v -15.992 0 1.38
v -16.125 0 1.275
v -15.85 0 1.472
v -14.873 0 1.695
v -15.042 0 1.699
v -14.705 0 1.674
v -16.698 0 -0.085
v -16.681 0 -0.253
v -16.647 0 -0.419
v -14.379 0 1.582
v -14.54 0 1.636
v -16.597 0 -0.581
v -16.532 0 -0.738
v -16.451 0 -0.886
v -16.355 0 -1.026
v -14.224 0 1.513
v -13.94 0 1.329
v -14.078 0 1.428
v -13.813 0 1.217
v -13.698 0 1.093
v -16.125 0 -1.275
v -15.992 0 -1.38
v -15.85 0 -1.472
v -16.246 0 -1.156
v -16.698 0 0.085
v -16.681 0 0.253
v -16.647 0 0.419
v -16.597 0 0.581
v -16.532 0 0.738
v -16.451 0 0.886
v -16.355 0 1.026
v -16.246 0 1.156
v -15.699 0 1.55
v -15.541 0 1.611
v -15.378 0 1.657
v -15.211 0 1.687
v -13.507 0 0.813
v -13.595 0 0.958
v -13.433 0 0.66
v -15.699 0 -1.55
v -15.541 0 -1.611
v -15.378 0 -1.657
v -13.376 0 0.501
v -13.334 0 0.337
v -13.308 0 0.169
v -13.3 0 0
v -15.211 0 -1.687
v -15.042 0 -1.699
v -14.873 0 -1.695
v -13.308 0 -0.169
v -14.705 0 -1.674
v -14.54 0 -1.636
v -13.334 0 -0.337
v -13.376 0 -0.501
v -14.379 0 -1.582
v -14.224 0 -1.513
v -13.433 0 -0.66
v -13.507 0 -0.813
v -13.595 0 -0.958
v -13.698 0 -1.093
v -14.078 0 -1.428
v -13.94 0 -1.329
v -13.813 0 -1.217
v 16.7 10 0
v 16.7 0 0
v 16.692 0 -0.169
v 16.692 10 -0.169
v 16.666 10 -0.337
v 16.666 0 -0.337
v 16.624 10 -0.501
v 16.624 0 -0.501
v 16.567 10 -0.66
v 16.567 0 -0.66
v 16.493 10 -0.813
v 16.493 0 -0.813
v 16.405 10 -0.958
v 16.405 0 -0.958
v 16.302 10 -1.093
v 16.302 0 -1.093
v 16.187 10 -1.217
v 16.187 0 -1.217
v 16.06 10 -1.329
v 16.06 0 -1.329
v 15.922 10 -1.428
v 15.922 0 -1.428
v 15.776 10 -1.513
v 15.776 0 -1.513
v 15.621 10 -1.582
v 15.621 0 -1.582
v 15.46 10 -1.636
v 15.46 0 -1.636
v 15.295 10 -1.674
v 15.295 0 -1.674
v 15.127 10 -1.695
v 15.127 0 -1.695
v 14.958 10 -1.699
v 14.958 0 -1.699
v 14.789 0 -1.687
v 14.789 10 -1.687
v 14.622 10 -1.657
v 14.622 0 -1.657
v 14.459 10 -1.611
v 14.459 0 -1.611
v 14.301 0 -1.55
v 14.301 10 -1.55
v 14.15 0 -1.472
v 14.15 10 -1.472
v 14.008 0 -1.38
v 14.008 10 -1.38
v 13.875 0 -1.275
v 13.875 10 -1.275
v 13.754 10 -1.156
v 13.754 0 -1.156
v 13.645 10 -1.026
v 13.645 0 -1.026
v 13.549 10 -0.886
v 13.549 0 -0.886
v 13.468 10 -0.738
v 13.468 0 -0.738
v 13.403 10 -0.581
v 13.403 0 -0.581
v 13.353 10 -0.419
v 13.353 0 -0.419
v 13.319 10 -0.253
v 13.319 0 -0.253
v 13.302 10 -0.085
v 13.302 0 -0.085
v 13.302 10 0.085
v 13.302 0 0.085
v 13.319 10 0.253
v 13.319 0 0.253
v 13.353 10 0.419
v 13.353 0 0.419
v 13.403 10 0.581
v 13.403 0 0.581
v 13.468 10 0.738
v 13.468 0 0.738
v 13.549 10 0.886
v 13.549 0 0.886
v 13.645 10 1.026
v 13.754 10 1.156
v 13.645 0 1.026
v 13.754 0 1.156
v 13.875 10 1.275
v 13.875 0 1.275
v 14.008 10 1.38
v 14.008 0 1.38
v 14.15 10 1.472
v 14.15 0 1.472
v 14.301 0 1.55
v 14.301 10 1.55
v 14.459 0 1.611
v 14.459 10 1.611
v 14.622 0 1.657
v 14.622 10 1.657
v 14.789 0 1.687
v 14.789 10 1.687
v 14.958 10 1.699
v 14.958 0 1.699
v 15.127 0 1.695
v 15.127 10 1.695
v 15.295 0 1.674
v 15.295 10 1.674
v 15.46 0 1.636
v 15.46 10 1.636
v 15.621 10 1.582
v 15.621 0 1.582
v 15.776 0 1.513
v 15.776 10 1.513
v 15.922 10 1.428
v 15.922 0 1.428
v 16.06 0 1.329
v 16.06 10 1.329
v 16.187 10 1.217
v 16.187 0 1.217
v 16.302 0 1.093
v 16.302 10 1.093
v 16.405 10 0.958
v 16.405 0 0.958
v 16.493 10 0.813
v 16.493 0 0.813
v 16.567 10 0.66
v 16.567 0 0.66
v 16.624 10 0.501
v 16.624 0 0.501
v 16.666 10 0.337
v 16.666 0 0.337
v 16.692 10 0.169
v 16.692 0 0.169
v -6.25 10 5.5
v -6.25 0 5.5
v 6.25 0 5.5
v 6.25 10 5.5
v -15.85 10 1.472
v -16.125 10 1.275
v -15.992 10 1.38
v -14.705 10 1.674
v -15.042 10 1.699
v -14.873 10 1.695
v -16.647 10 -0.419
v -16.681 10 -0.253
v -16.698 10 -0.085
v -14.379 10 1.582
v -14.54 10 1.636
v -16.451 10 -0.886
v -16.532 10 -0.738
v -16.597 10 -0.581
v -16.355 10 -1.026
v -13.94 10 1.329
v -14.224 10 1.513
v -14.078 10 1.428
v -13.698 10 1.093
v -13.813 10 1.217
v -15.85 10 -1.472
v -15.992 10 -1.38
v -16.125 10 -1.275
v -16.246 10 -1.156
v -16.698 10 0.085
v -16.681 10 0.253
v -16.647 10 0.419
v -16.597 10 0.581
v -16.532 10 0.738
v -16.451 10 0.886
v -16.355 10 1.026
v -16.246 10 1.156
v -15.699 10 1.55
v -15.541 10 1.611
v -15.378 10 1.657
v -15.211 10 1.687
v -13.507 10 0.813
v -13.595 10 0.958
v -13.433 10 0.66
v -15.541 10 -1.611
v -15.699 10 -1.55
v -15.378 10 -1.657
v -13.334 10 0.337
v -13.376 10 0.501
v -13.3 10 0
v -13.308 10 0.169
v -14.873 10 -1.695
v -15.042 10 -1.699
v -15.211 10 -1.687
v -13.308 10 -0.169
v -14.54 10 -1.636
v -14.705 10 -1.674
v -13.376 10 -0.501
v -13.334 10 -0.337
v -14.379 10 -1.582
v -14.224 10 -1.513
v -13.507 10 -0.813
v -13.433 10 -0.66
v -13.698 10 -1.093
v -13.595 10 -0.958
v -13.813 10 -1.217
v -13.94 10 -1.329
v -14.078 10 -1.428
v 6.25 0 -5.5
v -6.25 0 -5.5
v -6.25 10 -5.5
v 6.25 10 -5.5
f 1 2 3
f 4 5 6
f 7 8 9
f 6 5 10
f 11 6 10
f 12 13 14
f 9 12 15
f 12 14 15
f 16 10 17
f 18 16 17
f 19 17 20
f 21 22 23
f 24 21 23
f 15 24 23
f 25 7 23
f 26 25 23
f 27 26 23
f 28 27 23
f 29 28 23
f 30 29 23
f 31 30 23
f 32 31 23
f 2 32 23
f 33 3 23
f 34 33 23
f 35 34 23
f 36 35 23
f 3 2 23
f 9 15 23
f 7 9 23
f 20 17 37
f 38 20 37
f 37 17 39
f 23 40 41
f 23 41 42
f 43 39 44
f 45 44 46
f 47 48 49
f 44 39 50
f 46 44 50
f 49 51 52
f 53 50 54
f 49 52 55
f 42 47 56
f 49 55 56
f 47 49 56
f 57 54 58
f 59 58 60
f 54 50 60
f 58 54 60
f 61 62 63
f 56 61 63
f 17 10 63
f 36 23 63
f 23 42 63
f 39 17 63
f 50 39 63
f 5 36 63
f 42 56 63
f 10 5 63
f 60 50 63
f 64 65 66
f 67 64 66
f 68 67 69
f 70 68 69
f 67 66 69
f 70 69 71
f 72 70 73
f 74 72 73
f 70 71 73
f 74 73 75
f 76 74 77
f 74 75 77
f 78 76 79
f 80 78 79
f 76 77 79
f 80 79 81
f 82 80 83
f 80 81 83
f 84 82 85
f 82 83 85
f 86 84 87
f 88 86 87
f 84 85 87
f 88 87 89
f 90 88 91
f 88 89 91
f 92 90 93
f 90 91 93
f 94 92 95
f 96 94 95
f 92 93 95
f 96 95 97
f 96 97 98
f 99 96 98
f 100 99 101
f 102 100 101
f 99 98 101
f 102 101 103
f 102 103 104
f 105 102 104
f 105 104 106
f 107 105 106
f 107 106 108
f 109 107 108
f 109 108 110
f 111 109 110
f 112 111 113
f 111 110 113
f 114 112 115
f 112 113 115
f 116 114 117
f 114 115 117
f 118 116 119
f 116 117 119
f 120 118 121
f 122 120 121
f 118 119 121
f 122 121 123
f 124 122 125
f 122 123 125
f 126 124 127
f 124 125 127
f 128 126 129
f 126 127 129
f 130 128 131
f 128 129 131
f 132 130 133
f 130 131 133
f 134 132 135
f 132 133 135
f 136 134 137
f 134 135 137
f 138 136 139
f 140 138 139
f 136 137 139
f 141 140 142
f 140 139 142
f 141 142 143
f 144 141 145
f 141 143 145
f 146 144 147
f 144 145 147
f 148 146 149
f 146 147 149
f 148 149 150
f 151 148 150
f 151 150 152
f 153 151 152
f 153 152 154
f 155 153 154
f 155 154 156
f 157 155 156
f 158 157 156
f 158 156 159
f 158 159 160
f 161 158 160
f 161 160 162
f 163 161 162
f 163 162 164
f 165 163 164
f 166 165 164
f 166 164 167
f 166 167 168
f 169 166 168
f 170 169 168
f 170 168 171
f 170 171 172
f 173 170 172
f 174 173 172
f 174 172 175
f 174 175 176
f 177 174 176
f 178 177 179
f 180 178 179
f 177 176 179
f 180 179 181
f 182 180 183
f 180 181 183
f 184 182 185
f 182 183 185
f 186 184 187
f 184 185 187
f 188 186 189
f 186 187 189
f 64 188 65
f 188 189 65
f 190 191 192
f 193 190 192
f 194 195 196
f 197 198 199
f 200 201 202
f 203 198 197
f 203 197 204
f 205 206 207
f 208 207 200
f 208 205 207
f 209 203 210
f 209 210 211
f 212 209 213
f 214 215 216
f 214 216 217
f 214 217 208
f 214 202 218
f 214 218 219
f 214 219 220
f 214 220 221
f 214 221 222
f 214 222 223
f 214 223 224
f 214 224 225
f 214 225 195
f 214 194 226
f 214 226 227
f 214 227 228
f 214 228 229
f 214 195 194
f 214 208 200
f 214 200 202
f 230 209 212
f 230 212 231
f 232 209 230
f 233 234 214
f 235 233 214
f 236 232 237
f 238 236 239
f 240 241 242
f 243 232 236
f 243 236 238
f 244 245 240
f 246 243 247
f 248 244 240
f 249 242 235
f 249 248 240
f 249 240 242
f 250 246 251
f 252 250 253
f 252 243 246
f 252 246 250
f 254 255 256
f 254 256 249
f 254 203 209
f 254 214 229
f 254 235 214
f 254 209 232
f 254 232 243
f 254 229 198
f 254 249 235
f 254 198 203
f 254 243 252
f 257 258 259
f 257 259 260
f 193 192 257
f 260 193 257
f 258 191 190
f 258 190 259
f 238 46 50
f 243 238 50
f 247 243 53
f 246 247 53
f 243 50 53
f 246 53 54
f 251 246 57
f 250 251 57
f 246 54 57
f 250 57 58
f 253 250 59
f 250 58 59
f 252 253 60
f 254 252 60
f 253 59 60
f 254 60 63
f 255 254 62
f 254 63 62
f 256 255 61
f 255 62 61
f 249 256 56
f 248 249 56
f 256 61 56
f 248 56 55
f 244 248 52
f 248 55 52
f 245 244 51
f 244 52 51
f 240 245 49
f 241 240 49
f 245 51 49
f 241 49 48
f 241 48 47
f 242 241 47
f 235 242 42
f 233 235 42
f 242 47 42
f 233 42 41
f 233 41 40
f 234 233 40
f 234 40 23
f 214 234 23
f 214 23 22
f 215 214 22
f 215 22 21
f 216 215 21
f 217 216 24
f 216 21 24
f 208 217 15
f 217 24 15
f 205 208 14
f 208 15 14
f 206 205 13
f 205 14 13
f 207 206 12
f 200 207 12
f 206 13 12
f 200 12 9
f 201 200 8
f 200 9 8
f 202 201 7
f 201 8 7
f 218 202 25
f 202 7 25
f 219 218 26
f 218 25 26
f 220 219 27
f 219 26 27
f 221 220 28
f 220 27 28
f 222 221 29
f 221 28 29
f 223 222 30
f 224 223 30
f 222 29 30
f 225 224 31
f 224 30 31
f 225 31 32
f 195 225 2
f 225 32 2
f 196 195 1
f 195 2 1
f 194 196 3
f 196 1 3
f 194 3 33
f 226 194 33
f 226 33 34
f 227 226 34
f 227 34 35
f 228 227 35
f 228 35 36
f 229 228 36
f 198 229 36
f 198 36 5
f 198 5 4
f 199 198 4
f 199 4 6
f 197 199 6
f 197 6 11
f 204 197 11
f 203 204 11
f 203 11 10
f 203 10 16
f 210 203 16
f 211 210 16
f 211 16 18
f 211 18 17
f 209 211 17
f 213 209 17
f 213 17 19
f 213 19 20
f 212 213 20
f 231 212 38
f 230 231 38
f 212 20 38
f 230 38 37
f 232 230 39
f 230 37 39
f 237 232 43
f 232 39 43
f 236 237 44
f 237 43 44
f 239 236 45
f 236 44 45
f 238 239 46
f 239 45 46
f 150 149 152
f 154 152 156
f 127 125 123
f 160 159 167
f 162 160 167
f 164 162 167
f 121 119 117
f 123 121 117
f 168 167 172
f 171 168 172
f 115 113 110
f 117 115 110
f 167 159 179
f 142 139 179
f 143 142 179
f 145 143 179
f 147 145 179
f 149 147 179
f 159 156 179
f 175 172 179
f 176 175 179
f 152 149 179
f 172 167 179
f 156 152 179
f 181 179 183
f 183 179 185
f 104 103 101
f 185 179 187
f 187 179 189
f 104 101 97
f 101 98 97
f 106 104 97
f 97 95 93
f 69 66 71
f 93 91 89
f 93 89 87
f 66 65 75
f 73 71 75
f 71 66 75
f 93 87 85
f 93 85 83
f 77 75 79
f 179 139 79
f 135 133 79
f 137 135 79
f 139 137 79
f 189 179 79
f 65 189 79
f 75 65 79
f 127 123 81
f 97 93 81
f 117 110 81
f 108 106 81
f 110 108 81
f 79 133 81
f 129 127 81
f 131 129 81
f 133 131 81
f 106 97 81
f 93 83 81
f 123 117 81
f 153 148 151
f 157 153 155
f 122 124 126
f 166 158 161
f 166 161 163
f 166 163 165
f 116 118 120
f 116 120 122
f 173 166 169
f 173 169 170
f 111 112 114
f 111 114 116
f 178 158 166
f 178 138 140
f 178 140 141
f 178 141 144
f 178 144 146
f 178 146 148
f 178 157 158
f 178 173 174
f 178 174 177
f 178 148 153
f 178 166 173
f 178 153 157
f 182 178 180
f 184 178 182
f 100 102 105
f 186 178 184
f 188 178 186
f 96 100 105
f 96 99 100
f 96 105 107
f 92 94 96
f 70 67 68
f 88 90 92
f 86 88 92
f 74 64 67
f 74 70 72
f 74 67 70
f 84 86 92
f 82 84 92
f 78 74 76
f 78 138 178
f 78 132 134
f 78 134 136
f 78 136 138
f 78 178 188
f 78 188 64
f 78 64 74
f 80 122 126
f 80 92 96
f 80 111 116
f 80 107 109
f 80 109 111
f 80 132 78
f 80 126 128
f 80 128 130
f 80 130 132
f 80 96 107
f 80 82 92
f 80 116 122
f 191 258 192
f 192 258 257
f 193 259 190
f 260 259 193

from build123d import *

# Parameters (mm, degrees)
SKETCH2_R             = 1.7
BOSS_EXTRUDE1_DEPTH   = 10
BOSS_EXTRUDE1_2_DEPTH = 10
SKETCH2_W             = 12.5
SKETCH2_H             = 11
BOSS_EXTRUDE1_3_DEPTH = 10


with BuildPart() as part:
    # Sketch2 → Boss-Extrude1 (new body)
    with BuildSketch(Plane(origin=(0, 0, 0), x_dir=(1, 0, 0), z_dir=(0, 1, 0))):
        with Locations((15, 0)):
            Circle(SKETCH2_R)
    extrude(amount=BOSS_EXTRUDE1_DEPTH)


with BuildPart() as body_2:
    # Sketch2 → Boss-Extrude1 2 (new body)
    with BuildSketch(Plane(origin=(0, 0, 0), x_dir=(1, 0, 0), z_dir=(0, 1, 0))):
        with Locations((-15, 0)):
            Circle(SKETCH2_R)
    extrude(amount=BOSS_EXTRUDE1_2_DEPTH)


with BuildPart() as body_3:
    # Sketch2 → Boss-Extrude1 3 (new body)
    with BuildSketch(Plane(origin=(0, 0, 0), x_dir=(1, 0, 0), z_dir=(0, 1, 0))):
        Rectangle(SKETCH2_W, SKETCH2_H)
    extrude(amount=BOSS_EXTRUDE1_3_DEPTH)


solid = Compound([part.part, body_2.part, body_3.part])
